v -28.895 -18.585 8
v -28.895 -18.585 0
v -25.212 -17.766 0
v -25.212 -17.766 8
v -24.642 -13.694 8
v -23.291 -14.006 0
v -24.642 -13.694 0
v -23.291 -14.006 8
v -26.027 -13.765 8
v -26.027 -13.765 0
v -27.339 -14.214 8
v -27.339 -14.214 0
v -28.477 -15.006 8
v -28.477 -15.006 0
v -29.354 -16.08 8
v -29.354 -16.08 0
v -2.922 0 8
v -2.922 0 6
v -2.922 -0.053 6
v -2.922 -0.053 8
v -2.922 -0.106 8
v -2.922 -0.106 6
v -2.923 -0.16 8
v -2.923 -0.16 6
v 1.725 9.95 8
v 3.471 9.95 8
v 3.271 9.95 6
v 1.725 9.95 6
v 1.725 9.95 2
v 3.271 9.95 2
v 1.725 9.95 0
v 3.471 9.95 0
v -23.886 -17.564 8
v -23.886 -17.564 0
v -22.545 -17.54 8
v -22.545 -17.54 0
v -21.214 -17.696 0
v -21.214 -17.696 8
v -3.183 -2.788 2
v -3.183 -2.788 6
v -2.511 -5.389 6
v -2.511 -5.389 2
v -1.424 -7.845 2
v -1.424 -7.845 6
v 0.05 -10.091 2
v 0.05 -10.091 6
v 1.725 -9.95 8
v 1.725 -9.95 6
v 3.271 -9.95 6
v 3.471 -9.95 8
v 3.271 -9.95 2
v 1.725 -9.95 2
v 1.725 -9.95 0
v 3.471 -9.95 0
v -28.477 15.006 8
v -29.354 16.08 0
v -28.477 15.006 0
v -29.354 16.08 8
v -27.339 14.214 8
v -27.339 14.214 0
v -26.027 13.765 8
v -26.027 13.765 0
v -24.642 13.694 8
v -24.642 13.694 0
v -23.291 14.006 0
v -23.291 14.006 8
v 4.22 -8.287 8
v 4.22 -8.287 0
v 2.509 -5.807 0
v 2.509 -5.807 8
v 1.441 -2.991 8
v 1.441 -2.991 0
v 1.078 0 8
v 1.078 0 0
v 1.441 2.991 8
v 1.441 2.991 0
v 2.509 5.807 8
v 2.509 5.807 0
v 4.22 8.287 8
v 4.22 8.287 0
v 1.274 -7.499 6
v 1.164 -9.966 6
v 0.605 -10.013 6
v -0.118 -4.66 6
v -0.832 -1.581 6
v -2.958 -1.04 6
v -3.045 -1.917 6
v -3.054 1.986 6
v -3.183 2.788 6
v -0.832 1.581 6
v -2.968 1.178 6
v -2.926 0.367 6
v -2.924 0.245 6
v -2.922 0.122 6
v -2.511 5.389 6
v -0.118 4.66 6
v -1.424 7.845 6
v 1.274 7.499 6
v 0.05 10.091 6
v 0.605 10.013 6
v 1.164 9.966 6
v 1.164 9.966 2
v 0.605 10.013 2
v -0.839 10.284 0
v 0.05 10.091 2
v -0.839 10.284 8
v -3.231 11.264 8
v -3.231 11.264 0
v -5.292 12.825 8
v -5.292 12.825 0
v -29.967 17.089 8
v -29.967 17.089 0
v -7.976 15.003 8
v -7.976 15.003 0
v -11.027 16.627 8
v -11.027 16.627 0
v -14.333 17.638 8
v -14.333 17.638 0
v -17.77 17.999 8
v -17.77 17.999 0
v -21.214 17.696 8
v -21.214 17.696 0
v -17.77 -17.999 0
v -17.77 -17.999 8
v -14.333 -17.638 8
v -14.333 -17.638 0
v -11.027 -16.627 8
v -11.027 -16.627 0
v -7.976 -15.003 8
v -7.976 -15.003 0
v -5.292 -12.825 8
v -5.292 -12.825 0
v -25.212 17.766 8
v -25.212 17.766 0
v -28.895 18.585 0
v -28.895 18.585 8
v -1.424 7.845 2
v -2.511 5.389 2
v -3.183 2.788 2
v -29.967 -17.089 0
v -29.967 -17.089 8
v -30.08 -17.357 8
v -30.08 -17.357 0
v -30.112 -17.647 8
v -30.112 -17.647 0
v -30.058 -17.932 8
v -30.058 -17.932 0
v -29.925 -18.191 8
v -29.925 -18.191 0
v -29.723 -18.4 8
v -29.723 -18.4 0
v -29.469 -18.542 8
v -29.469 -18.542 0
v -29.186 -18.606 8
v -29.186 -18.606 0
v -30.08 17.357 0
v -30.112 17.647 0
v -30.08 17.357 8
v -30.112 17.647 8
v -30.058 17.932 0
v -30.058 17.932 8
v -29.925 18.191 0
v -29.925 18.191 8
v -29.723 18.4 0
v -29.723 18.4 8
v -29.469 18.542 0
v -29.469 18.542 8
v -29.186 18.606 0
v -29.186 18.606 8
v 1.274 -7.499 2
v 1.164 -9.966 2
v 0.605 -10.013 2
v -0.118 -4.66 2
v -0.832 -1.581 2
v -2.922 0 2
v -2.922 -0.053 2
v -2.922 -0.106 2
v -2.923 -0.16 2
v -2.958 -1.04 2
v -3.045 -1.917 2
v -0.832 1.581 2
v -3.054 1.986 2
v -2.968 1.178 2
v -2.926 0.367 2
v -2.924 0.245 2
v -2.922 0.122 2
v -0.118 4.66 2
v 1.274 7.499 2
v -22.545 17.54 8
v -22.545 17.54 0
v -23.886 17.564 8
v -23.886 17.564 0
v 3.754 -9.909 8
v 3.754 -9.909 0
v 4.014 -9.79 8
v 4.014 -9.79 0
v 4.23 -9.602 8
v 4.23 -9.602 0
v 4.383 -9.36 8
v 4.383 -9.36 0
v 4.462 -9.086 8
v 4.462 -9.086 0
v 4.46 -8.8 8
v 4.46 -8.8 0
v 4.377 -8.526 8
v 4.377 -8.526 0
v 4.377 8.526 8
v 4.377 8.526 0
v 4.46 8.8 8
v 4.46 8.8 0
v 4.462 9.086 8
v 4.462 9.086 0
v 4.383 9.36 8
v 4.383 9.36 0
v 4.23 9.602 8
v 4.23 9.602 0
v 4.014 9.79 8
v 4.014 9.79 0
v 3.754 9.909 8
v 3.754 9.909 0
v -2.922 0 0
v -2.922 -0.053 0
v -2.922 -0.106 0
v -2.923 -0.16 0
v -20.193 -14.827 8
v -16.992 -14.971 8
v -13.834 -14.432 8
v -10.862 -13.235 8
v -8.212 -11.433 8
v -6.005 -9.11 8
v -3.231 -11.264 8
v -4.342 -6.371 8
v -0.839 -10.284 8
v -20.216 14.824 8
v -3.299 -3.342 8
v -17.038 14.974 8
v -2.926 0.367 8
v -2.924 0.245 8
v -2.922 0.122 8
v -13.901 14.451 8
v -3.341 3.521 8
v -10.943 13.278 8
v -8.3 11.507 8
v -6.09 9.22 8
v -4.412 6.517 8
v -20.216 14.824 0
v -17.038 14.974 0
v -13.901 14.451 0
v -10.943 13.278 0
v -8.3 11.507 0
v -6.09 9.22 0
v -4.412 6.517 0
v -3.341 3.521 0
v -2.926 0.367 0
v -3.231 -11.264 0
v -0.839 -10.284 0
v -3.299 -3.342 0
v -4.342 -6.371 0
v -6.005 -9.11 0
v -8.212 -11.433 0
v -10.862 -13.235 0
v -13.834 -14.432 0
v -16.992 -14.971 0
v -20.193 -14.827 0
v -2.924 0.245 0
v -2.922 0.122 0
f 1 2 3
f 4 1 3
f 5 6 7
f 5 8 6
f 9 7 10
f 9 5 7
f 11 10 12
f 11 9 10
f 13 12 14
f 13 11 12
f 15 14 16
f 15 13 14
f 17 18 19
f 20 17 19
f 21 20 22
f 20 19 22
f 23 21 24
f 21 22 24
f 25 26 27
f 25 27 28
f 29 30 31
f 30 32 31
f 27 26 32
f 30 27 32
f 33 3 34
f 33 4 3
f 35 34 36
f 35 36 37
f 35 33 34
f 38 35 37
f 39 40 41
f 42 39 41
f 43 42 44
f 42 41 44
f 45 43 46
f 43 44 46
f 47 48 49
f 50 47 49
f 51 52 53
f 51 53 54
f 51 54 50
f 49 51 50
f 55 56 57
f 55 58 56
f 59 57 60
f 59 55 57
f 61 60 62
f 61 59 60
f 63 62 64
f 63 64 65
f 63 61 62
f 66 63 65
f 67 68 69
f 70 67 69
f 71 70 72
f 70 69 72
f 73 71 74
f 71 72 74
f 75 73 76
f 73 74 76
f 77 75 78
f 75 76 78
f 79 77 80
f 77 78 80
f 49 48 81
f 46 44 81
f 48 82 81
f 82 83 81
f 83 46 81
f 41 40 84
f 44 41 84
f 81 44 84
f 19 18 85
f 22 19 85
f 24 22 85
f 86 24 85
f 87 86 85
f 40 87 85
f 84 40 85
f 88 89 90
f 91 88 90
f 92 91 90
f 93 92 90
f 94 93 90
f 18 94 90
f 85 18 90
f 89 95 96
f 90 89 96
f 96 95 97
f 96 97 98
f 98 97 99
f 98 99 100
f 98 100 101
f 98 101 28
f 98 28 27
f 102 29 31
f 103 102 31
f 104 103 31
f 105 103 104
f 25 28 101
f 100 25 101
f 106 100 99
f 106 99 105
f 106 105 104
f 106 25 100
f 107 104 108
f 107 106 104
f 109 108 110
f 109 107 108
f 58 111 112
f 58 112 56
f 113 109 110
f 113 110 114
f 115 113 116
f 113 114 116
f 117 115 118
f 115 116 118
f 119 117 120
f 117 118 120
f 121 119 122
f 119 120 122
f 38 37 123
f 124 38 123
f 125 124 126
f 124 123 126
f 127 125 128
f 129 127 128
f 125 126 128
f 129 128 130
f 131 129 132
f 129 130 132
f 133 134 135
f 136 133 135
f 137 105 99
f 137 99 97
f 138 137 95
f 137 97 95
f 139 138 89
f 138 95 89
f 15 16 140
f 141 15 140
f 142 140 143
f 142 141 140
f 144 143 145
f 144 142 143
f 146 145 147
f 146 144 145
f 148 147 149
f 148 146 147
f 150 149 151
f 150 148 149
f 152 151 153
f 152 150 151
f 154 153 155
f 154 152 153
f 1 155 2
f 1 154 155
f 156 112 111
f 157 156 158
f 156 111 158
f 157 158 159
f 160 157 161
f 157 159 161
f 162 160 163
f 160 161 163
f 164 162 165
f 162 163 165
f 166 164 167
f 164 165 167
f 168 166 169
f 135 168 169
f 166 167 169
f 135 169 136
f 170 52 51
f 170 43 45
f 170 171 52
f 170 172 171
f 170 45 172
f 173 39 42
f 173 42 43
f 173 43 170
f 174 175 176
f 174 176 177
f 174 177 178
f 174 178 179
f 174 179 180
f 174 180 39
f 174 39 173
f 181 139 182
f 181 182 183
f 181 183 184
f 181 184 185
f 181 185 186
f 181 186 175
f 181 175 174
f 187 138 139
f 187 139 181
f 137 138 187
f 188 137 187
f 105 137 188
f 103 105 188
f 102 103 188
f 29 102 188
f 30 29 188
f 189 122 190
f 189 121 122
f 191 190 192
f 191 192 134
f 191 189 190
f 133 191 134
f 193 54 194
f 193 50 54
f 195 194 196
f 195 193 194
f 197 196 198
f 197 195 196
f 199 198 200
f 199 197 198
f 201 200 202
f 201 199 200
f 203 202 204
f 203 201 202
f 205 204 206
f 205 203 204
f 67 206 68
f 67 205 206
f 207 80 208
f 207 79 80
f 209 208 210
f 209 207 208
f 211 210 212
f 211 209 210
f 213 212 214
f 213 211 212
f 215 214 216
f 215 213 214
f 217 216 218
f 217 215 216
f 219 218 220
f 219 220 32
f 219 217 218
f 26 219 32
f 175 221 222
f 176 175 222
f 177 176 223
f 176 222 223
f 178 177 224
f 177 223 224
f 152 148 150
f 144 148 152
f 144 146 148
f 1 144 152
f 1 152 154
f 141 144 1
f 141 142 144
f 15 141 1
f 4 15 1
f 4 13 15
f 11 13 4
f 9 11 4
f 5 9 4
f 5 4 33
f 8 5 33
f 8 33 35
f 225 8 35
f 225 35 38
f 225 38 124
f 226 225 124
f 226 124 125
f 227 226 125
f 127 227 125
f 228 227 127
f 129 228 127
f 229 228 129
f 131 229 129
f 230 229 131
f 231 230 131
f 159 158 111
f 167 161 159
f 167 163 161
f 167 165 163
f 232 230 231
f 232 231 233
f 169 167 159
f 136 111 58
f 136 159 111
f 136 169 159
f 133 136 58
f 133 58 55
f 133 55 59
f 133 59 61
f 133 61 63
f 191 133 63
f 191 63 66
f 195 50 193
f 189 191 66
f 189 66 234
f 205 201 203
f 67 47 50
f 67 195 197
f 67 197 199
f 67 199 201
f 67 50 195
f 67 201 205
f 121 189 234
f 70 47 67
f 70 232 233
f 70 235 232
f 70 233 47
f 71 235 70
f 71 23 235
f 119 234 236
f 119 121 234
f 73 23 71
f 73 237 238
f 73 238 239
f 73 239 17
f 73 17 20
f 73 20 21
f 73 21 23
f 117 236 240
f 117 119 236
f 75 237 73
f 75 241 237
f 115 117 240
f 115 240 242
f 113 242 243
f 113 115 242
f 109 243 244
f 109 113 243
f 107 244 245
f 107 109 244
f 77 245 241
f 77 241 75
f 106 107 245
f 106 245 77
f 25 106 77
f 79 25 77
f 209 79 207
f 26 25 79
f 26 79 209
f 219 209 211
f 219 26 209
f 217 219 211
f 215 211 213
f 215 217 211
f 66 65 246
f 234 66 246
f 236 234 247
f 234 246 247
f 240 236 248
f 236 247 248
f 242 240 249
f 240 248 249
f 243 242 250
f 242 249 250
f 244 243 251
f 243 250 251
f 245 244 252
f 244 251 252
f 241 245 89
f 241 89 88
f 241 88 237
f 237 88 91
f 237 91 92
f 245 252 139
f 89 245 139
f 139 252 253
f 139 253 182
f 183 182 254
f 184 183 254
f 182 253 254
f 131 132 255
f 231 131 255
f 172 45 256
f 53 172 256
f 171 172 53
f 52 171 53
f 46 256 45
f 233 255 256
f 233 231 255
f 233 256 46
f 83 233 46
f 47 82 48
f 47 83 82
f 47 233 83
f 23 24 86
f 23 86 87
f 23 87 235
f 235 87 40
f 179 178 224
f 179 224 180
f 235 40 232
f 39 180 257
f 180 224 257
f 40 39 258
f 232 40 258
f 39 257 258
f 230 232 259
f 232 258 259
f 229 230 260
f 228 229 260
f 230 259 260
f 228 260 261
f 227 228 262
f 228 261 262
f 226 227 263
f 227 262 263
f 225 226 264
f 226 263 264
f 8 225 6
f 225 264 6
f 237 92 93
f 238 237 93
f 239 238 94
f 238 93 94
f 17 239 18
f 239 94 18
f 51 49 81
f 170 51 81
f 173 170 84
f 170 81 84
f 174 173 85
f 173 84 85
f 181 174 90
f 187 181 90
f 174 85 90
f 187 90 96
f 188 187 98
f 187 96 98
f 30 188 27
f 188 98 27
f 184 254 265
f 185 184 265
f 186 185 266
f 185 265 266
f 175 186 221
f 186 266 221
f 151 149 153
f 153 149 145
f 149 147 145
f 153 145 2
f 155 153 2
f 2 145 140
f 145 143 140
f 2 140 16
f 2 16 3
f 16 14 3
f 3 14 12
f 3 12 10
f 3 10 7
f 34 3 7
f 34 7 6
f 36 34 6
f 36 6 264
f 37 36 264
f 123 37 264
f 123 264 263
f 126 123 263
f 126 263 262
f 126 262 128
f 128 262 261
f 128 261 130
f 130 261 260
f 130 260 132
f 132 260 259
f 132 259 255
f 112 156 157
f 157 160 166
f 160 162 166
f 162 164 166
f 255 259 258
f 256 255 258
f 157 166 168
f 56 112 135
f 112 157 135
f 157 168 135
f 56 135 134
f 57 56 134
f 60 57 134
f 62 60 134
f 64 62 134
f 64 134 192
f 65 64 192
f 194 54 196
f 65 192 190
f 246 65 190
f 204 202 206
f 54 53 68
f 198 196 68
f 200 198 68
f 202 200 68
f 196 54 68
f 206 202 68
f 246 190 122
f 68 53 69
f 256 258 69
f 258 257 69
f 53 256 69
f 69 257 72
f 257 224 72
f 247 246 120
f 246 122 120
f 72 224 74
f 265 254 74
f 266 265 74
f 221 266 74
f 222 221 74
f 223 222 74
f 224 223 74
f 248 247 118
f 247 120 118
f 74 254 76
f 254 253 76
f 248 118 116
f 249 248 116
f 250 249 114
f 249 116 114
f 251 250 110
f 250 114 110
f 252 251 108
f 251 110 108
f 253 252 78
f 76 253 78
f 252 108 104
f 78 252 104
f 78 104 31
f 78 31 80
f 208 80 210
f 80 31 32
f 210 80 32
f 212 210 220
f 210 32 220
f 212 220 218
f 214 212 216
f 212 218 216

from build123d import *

# Parameters (mm, degrees)
F1_DEPTH = 8
F2_R     = 5
F3_R     = 1
F4_R     = 10
F7_DEPTH = 4
F8_R     = 1


# Not quite as in the source:
# - a feature names something its author has since deleted; it is built from what else it names


with BuildPart() as f1:
    # F0 (on Top) → F1 (new body)
    with BuildSketch(Plane.XY):
        with BuildLine():
            ThreePointArc((-2.9227996939, -0.1596333839), (-11.2678550126, -13.4433261015), (-26.890906557, -12.0232201439))
            Line((-26.890906557, -12.0232201439), (-31.1837848276, -19.0931353718))
            Line((-31.1837848276, -19.0931353718), (-22.9890488593, -17.2720731705))
            ThreePointArc((-22.9890488593, -17.2720731705), (-11.7519193442, -16.909486057), (-2.9219502426, -9.9498743711))
            Line((-2.9219502426, -9.9498743711), (6.0116767822, -9.9498743711))
            ThreePointArc((6.0116767822, -9.9498743711), (1.0780497574, 0), (6.0116767822, 9.9498743711))
            Line((6.0116767822, 9.9498743711), (-2.9219502426, 9.9498743711))
            ThreePointArc((-2.9219502426, 9.9498743711), (-11.7519193442, 16.909486057), (-22.9890488593, 17.2720731705))
            Line((-22.9890488593, 17.2720731705), (-31.1837848276, 19.0931353718))
            Line((-31.1837848276, 19.0931353718), (-26.890906557, 12.0232201439))
            ThreePointArc((-26.890906557, 12.0232201439), (-11.3609432233, 13.4890024425), (-2.9264400932, 0.3669814152))
            Line((-2.9264400932, 0.3669814152), (-2.9219502426, 0.3647975664))
            Line((-2.9219502426, 0.3647975664), (-2.9219502426, -3.27e-08))
            Line((-2.9219502426, -3.27e-08), (-2.9219502426, -0.1592372783))
            Line((-2.9219502426, -0.1592372783), (-2.9227996939, -0.1596333839))
        make_face()
        with BuildLine():
            ThreePointArc((-2.9219502426, -3.27e-08), (-2.922162607, -0.0798178383), (-2.9227996939, -0.1596333839))
            Line((-2.9227996939, -0.1596333839), (-2.9219502426, -0.1592372783))
            Line((-2.9219502426, -0.1592372783), (-2.9219502426, -3.27e-08))
        make_face()
        with BuildLine():
            ThreePointArc((-2.9264400932, 0.3669814152), (-2.923072747, 0.1835044236), (-2.9219502426, -3.27e-08))
            Line((-2.9219502426, -3.27e-08), (-2.9219502426, 0.3647975664))
            Line((-2.9219502426, 0.3647975664), (-2.9264400932, 0.3669814152))
        make_face()
    extrude(amount=F1_DEPTH)

    # F2
    f2_edges = [f1.edges().sort_by_distance(p)[0] for p in [
        (-26.890907, 12.02322, 4),
        (-26.890907, -12.02322, 4),
    ]]
    fillet(f2_edges, radius=F2_R)

    # F3
    f3_edges = [f1.edges().sort_by_distance(p)[0] for p in [
        (-31.183785, -19.093135, 4),
        (-31.183785, 19.093135, 4),
    ]]
    fillet(f3_edges, radius=F3_R)

    # F4
    f4_edges = [f1.edges().sort_by_distance(p)[0] for p in [
        (-2.92195, 9.949874, 4),
        (-2.92195, -9.949874, 4),
        (-22.989049, 17.272073, 4),
        (-22.989049, -17.272073, 4),
    ]]
    fillet(f4_edges, radius=F4_R)

    # F6 (on offset) → F7 (cut)
    with BuildSketch(Plane.XY.offset(6)):
        with BuildLine():
            ThreePointArc((11.3967054025, -13.8123607251), (-0.7746921386, -2.0181552322), (7.4959259895, 12.7751904709))
            Line((7.4959259895, 12.7751904709), (2.6926121721, 12.7751904709))
            ThreePointArc((2.6926121721, 12.7751904709), (-3.3979094134, -0.8877509035), (4.1336827916, -13.8123607251))
            Line((4.1336827916, -13.8123607251), (11.3967054025, -13.8123607251))
        make_face()
    extrude(amount=-F7_DEPTH, mode=Mode.SUBTRACT)

    # F8
    f8_edges = [f1.edges().sort_by_distance(p)[0] for p in [
        (6.011677, 9.949874, 4),
        (6.011677, -9.949874, 4),
    ]]
    fillet(f8_edges, radius=F8_R)


solid = f1.part
